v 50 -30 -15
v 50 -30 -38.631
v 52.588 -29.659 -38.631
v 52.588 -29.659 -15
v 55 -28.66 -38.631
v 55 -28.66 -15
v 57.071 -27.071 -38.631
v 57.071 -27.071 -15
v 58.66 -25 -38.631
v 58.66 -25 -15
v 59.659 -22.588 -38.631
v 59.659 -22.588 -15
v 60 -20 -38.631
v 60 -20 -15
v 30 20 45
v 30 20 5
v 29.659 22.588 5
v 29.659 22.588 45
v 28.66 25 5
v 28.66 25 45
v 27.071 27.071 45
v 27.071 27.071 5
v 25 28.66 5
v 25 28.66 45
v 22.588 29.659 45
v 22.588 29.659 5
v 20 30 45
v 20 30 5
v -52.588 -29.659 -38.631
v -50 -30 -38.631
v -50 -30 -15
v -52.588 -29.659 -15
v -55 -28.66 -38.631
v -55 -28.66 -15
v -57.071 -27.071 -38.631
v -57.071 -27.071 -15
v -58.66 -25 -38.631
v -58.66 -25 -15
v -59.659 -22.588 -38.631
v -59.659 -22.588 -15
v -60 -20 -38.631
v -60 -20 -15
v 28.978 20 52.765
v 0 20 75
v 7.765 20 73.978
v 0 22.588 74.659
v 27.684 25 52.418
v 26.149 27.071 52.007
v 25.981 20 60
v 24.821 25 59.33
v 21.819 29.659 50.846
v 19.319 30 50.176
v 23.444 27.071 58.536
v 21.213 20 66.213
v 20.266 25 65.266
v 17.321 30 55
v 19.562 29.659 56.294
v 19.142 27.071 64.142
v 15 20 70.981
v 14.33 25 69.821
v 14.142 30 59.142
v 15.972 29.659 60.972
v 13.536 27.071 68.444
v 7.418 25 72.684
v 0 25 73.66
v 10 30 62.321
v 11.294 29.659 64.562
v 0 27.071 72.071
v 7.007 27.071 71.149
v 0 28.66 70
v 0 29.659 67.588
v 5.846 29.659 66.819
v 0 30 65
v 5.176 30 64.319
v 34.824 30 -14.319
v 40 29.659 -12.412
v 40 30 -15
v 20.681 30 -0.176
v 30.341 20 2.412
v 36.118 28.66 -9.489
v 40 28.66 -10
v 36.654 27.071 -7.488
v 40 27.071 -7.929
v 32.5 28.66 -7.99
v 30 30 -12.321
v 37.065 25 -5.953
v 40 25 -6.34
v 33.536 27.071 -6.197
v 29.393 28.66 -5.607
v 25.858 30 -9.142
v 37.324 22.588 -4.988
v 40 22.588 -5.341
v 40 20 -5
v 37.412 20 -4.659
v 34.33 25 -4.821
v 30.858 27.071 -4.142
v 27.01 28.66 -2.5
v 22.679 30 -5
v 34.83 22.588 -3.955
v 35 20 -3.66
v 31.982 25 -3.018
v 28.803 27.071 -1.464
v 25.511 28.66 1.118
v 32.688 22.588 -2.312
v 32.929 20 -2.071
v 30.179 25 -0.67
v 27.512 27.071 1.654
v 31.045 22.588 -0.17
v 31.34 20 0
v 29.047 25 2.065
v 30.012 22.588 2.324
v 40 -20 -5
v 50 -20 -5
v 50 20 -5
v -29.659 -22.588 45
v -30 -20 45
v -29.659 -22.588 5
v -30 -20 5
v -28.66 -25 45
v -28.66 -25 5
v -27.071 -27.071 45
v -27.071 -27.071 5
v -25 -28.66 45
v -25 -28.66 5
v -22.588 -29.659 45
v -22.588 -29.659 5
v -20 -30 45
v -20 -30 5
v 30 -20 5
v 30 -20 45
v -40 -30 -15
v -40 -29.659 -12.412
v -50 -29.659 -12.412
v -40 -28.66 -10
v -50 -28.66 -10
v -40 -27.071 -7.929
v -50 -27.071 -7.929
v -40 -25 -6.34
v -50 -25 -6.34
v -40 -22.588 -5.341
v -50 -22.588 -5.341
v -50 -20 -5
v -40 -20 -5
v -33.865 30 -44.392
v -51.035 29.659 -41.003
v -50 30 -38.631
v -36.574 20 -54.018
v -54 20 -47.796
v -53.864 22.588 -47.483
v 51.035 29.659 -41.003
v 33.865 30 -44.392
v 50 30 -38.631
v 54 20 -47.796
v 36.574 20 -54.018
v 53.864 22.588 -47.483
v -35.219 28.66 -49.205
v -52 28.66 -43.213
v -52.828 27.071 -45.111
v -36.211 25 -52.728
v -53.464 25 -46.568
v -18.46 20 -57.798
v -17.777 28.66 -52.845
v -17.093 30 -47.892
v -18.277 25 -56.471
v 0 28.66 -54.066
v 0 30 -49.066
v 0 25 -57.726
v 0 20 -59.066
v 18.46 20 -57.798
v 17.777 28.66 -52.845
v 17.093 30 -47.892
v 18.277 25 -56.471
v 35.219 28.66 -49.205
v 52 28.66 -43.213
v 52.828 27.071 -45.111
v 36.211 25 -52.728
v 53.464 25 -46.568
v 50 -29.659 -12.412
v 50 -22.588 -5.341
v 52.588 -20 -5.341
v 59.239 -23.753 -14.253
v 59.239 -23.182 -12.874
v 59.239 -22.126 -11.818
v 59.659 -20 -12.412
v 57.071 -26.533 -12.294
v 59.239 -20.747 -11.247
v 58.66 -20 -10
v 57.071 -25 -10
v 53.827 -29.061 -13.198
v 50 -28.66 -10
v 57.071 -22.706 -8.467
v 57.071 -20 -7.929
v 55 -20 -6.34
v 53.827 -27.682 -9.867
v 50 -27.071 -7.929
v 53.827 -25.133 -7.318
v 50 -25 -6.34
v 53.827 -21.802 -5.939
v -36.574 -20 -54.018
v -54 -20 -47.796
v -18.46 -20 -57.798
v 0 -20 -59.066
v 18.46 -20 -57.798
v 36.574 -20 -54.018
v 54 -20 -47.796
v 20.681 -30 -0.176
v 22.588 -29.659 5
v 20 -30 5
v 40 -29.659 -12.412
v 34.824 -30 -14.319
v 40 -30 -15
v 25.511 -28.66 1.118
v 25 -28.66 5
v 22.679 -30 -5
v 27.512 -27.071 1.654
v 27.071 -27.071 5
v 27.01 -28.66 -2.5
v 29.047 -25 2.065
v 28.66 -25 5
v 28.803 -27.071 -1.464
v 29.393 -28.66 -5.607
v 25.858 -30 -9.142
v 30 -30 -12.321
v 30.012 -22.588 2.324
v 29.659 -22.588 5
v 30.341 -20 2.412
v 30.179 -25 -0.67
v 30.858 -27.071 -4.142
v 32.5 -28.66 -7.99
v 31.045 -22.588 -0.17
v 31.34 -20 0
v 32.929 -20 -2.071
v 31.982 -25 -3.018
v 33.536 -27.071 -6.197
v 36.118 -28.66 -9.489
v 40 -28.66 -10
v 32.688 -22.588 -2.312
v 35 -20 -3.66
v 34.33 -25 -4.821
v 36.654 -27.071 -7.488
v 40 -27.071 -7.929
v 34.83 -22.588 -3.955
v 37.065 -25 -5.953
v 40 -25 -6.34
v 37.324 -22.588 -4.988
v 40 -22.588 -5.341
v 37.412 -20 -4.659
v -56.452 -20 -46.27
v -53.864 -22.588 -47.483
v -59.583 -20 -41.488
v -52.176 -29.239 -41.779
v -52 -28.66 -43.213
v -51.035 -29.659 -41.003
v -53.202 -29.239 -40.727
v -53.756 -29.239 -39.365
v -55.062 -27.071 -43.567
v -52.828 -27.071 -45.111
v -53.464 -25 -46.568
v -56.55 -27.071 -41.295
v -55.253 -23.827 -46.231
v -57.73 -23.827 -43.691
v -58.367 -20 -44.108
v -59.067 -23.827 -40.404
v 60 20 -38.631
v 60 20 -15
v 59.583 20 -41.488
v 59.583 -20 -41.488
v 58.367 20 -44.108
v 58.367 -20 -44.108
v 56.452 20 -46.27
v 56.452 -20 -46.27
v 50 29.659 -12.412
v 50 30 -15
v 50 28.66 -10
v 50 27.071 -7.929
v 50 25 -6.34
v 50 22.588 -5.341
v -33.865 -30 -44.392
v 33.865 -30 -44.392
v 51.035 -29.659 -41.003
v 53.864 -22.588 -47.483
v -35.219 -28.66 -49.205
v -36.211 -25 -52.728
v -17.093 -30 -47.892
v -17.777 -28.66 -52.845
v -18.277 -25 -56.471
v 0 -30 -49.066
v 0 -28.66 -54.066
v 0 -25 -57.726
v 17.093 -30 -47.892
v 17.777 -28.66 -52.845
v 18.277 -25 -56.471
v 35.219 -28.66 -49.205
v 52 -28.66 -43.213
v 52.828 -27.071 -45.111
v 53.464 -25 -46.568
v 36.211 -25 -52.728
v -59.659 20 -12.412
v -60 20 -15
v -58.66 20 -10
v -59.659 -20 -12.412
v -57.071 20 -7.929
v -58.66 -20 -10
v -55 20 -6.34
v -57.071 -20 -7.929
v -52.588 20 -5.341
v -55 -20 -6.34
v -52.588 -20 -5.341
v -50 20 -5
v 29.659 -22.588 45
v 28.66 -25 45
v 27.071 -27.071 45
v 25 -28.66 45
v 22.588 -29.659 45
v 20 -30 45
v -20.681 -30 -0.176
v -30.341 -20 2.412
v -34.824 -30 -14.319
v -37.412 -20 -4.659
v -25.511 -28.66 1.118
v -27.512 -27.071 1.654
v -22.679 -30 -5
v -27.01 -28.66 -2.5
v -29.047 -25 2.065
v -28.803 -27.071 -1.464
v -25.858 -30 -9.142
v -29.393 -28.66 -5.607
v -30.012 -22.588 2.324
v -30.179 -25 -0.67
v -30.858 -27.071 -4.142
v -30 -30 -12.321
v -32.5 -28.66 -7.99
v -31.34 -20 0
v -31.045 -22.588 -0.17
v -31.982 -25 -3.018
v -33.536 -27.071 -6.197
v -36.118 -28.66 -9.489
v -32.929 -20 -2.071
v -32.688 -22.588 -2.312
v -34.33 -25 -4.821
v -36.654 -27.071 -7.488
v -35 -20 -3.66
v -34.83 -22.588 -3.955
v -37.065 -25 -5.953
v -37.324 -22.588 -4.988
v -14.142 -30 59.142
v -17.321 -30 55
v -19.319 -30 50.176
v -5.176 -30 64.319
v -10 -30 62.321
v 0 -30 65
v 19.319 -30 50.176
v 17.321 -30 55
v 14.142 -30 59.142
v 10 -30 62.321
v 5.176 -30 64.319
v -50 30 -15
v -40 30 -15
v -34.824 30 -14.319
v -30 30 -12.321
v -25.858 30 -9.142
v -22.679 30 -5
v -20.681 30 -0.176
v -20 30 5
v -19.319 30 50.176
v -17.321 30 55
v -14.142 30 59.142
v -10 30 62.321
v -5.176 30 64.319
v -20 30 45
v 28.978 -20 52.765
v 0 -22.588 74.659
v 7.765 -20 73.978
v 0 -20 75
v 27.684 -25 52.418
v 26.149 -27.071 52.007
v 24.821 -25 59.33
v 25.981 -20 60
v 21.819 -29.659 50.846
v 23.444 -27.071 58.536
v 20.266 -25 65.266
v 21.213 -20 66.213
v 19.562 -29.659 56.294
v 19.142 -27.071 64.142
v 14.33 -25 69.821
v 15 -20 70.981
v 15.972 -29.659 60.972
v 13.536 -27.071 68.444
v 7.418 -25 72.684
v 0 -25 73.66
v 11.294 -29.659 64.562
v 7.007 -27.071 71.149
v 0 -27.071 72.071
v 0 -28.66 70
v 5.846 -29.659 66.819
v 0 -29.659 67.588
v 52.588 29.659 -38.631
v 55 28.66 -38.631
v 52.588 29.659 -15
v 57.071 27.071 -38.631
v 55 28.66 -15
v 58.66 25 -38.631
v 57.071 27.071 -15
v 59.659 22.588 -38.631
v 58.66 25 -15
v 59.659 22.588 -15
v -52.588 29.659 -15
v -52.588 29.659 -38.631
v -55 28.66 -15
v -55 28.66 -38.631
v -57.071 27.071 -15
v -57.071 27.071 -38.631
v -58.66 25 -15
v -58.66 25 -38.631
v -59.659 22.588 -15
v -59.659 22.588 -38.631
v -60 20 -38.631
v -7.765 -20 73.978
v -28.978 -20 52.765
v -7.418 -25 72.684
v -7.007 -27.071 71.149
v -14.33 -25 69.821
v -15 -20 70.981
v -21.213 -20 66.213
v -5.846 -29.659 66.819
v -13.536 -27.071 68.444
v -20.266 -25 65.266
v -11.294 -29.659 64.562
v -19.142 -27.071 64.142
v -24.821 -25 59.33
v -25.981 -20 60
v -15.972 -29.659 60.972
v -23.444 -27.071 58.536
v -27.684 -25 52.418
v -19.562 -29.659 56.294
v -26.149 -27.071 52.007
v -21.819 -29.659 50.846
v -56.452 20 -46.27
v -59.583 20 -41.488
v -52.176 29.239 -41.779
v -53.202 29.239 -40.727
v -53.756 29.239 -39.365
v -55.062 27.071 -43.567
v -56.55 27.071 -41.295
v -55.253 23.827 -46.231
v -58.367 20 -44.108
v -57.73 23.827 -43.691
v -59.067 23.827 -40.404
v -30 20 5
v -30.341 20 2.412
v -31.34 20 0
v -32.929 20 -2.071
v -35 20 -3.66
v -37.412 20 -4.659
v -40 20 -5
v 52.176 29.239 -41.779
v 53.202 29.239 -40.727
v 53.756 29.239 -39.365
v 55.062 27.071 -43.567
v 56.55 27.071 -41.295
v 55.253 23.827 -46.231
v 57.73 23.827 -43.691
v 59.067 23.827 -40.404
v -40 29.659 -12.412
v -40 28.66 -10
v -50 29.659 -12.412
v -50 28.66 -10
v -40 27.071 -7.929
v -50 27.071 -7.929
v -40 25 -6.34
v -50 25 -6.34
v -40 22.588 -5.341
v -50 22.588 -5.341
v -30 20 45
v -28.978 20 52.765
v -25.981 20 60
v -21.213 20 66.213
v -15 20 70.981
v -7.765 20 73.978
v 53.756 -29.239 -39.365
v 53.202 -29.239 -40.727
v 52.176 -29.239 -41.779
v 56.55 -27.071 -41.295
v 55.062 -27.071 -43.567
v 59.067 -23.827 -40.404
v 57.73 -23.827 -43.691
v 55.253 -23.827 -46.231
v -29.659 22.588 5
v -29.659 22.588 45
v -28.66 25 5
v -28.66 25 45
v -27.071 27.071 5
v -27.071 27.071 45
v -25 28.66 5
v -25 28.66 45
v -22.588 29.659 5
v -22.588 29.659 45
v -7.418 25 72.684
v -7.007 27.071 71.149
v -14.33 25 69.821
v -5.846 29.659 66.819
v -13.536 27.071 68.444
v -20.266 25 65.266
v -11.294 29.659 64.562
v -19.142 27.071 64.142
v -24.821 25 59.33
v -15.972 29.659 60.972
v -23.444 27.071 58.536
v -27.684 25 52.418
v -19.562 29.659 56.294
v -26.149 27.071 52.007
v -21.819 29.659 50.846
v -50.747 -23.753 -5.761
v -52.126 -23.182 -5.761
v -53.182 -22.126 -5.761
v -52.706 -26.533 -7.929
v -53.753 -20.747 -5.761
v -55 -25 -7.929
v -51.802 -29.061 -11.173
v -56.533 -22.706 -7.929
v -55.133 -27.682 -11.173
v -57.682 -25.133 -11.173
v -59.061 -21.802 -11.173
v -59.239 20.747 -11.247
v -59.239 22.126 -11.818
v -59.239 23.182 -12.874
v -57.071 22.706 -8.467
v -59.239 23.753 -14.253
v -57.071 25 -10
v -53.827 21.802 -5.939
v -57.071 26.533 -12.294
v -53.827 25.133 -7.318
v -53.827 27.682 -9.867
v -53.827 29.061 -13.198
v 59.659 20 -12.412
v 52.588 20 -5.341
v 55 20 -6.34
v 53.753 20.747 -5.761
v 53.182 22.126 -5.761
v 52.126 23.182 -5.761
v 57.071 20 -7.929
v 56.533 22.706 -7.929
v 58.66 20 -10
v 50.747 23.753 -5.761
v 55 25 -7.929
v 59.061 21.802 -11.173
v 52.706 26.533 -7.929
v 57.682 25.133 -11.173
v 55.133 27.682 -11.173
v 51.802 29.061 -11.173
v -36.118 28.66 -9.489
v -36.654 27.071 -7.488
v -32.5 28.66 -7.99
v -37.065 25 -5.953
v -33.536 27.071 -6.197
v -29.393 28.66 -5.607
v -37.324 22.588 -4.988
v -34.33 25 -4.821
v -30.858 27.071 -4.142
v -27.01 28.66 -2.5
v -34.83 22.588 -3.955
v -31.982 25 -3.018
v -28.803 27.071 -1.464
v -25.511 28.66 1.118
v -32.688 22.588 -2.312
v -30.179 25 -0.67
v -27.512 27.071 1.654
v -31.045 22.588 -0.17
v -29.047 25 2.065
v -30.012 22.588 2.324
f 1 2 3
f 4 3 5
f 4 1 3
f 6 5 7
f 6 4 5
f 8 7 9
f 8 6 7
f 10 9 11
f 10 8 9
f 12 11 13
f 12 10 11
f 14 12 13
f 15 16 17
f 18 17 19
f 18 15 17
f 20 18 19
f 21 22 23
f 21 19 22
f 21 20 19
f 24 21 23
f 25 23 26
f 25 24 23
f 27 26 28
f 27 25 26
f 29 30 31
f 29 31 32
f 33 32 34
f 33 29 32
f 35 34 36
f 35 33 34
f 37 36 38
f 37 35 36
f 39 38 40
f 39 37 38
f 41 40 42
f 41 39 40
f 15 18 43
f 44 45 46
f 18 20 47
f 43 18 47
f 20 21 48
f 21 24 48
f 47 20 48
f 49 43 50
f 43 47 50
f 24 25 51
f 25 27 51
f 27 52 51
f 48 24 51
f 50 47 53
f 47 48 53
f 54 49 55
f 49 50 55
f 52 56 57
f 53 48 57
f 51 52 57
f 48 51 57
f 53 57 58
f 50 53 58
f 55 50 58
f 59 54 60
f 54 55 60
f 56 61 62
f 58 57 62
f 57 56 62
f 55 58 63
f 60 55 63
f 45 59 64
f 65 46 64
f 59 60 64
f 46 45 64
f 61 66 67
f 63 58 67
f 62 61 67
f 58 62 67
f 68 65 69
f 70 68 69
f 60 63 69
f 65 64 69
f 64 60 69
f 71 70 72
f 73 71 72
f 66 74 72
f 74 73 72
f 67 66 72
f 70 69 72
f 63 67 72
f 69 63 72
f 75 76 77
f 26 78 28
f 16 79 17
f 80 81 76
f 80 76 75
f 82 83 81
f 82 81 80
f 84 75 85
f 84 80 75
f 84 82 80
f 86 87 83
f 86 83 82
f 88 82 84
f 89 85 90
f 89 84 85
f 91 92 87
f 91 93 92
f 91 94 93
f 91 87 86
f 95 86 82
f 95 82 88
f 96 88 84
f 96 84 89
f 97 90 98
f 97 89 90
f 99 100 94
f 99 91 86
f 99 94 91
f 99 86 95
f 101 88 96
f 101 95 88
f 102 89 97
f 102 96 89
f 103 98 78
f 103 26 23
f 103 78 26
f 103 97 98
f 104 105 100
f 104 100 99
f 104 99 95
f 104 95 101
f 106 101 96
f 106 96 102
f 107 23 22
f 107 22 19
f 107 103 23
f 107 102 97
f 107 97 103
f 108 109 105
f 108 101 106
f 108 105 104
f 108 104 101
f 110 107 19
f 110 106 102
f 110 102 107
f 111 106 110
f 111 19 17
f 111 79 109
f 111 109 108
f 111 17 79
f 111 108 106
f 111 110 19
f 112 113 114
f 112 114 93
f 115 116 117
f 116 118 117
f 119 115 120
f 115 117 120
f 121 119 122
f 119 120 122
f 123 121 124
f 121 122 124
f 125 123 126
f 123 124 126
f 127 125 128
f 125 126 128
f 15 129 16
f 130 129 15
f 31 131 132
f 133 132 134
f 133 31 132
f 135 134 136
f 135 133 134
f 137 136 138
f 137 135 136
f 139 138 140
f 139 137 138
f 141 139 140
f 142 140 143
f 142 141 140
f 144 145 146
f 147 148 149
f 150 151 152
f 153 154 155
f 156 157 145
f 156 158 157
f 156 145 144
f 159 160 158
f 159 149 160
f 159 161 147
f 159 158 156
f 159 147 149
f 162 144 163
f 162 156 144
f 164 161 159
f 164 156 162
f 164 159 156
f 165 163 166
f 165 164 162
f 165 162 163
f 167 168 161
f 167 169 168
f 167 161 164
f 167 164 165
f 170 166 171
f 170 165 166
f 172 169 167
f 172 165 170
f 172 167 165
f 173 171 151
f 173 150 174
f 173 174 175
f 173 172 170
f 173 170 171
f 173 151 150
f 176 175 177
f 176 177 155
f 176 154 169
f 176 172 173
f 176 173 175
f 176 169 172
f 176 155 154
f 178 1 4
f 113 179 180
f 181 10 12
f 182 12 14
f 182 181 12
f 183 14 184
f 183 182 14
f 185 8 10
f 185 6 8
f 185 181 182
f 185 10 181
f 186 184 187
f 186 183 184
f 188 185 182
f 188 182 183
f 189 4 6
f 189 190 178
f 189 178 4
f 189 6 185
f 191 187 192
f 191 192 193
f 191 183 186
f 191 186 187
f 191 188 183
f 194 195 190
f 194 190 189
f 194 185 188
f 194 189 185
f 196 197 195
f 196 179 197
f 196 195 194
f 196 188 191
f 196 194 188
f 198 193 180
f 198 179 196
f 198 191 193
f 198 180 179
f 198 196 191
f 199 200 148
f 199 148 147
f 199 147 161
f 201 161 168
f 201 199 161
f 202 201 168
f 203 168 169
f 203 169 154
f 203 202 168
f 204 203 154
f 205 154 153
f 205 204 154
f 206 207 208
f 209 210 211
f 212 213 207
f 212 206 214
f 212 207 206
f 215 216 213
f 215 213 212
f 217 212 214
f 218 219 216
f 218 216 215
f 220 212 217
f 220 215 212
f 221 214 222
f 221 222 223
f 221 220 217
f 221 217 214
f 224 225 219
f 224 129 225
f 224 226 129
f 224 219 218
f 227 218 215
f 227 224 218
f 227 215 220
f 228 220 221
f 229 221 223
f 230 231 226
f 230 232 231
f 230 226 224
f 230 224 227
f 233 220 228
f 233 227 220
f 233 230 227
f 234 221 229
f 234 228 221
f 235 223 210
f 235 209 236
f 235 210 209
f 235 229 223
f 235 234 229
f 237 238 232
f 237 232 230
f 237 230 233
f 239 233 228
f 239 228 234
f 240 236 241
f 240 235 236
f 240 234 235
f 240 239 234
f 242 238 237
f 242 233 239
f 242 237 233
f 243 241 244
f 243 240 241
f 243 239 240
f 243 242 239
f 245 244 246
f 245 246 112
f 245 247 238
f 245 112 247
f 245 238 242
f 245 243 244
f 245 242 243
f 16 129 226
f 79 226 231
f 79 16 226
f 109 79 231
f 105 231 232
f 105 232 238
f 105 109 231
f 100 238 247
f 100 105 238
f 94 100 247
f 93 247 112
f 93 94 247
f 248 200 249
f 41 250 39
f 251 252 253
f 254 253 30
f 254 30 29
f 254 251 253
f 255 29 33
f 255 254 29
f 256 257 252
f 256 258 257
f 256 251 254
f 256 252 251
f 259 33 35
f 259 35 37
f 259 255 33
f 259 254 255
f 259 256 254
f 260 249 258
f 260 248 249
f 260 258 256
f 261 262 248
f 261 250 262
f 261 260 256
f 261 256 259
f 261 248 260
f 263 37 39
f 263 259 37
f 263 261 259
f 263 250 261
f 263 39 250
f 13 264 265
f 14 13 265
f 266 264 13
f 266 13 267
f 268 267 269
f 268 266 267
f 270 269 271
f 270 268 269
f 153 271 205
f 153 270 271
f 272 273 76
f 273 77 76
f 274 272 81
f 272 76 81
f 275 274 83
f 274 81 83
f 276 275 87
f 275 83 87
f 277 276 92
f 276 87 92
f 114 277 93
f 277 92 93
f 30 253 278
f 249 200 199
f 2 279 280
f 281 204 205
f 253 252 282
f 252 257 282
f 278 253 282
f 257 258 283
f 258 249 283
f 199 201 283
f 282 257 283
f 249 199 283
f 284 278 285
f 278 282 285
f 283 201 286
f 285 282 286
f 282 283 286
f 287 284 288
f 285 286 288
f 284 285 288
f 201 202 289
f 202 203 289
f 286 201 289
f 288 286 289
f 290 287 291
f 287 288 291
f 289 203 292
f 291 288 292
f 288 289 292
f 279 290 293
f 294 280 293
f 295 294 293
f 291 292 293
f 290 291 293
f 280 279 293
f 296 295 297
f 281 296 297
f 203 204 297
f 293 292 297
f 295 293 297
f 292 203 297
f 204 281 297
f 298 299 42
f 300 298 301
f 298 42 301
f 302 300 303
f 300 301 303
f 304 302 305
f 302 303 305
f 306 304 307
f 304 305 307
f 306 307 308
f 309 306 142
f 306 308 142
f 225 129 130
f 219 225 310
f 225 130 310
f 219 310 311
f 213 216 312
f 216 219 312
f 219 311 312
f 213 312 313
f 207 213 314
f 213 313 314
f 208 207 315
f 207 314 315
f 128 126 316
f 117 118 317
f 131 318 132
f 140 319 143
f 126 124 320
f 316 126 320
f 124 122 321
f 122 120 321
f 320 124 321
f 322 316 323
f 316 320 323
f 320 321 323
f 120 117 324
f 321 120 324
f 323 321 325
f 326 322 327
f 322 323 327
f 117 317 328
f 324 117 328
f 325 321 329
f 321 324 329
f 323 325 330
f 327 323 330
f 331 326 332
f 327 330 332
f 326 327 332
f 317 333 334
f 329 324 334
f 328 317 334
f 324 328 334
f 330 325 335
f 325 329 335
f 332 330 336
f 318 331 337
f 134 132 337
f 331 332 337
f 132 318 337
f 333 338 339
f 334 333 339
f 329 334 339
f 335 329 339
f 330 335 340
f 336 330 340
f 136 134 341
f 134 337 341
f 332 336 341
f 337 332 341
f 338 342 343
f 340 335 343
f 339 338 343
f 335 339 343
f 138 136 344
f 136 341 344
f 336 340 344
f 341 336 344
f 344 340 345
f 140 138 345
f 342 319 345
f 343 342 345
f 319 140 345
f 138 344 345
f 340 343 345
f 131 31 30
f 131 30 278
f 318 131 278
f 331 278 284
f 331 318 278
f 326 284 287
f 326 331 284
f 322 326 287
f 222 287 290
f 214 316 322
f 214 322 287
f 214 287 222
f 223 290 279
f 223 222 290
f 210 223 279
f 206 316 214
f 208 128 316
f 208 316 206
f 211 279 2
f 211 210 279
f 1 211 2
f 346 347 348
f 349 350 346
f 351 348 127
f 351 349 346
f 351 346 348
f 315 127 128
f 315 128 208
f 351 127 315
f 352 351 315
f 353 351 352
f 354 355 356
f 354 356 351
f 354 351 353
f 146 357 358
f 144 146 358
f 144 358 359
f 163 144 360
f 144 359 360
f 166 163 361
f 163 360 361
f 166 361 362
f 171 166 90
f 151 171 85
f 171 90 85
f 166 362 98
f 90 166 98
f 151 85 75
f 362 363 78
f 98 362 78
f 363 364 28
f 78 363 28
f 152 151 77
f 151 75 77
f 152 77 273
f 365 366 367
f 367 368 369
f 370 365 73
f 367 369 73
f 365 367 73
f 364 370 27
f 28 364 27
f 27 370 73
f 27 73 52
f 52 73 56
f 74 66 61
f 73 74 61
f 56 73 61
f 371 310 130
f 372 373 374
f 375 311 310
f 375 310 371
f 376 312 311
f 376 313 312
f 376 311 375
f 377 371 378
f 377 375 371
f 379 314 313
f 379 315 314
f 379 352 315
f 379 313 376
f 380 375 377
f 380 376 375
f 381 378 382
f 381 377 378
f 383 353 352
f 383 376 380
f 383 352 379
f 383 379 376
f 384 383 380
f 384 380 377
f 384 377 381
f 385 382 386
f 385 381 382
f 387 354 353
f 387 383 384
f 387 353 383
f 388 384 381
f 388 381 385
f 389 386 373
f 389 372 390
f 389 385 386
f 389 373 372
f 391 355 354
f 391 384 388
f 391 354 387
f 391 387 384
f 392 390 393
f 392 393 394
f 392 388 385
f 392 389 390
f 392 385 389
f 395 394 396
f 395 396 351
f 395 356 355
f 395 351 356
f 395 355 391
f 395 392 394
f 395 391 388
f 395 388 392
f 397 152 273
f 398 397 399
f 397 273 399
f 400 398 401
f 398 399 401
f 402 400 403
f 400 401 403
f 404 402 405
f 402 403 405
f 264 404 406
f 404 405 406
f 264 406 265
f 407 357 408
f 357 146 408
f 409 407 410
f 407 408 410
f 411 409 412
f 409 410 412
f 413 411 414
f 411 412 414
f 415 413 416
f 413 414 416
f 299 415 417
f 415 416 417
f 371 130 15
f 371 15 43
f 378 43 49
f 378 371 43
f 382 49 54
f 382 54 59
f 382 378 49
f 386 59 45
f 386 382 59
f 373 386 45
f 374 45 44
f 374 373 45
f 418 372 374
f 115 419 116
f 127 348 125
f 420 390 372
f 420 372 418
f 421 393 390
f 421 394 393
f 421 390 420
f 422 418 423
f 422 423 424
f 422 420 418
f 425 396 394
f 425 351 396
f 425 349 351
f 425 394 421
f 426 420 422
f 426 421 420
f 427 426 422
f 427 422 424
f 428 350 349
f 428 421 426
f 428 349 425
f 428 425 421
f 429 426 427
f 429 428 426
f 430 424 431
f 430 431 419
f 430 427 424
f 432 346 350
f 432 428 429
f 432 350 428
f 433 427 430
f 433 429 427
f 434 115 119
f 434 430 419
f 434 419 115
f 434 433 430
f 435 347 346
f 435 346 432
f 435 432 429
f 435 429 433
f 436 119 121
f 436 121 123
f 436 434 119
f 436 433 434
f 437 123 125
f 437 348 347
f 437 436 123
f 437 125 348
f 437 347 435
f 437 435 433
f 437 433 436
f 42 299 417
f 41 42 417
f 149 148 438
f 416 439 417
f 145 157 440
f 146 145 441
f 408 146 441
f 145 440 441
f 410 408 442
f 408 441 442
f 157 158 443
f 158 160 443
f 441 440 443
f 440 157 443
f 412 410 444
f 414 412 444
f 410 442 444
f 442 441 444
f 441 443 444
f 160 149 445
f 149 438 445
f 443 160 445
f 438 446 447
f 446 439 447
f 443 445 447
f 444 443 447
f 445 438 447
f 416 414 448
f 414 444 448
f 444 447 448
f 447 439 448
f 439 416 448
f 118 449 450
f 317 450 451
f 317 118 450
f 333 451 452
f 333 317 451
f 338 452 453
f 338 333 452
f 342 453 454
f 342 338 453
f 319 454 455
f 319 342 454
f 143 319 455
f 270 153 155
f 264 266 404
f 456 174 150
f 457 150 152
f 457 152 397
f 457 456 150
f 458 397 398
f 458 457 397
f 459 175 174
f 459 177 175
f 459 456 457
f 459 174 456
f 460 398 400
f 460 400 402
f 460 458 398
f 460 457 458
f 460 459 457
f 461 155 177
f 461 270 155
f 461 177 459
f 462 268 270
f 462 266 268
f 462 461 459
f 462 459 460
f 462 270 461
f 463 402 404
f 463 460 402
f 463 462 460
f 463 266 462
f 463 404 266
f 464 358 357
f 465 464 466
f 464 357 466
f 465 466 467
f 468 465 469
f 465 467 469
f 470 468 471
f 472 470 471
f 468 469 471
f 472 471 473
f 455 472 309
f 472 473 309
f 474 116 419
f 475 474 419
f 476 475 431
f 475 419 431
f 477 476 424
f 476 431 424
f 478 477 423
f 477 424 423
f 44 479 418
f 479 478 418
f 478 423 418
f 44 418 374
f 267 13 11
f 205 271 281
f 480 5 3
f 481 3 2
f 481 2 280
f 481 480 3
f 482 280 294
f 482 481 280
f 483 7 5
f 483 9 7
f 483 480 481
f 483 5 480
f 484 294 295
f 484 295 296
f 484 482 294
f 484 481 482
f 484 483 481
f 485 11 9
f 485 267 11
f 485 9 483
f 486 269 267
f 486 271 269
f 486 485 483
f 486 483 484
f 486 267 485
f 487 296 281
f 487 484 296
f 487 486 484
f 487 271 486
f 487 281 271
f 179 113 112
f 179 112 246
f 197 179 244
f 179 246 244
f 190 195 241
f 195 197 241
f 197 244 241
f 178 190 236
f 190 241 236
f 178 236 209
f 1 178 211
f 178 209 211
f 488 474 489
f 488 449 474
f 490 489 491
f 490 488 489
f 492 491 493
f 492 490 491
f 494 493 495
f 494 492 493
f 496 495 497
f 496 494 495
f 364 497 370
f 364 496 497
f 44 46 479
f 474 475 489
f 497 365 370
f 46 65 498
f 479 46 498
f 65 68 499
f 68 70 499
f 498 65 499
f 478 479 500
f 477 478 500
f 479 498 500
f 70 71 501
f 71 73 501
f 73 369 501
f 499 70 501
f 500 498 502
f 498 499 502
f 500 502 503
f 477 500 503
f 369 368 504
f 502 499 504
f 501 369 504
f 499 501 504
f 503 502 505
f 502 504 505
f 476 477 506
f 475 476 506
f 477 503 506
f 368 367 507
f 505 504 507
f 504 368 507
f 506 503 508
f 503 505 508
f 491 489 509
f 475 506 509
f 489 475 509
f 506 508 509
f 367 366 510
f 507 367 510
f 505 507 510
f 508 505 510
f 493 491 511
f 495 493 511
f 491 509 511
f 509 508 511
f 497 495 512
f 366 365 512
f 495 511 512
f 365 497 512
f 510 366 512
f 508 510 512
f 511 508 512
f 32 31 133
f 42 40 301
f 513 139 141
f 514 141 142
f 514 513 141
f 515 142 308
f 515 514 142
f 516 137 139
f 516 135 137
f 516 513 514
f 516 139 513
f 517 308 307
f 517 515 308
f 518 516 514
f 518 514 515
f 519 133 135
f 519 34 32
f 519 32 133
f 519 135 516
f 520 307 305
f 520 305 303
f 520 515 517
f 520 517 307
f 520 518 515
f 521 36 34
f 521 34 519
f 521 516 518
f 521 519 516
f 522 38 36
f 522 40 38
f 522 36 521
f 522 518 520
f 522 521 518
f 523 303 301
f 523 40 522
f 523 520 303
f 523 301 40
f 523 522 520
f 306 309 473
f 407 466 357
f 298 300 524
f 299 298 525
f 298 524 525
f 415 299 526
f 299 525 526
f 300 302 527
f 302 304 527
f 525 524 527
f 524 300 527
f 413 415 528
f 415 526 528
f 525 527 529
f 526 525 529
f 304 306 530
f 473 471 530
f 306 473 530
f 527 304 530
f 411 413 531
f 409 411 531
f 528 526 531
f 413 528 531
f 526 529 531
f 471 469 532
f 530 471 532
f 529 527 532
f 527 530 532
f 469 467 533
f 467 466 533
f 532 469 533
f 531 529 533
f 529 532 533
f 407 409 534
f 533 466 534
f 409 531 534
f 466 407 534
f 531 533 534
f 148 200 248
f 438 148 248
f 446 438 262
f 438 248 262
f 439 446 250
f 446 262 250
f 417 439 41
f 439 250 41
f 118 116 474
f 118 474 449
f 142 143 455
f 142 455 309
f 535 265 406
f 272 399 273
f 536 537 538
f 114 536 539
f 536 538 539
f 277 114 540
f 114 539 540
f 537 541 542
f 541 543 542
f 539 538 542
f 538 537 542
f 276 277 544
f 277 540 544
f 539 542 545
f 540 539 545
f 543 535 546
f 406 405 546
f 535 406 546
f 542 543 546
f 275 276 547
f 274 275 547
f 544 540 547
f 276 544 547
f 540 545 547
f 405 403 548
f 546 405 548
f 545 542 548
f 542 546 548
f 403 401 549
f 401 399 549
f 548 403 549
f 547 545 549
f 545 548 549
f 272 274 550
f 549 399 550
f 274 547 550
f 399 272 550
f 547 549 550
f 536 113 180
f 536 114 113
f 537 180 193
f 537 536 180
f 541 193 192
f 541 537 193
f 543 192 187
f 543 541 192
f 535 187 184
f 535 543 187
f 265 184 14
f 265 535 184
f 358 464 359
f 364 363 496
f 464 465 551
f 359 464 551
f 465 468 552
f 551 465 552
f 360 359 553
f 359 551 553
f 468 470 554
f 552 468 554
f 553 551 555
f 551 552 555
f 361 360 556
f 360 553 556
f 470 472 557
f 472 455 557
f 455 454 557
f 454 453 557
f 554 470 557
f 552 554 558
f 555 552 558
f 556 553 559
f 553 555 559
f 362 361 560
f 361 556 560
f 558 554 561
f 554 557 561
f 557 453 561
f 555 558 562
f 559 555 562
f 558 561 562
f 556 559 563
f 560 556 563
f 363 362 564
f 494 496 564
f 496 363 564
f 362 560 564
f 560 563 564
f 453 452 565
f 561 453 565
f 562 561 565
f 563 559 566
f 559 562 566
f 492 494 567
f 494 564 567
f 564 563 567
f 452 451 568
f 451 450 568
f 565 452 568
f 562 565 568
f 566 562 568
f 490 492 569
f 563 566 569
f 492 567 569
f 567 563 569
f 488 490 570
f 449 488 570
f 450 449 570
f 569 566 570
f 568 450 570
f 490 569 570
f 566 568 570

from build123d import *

# Parameters (mm, degrees)
F1_DEPTH = 30
F2_R     = 29.99999
F3_R     = 10


# Not quite as in the source:
# - a fillet or chamfer is up to 0.001 mm smaller than in the source, because OpenCascade refuses the exact size


with BuildPart() as f1:
    # F0 (on Front) → F1 (new body, symmetric)
    with BuildSketch(Plane.XZ):
        with BuildLine():
            Line((30, -5), (30, 75))
            Line((30, 75), (-30, 75))
            Line((-30, 75), (-30, -5))
            Line((-30, -5), (-60, -5))
            Line((-60, -5), (-60, -45))
            ThreePointArc((-60, -45), (0, -59.0661337755), (60, -45))
            Line((60, -45), (60, -5))
            Line((60, -5), (30, -5))
        make_face()
    extrude(amount=F1_DEPTH, both=True)

    # F2 (radius 30 in the source; OpenCascade refuses exactly that, so slightly less here)
    f2_edges = [f1.edges().sort_by_distance(p)[0] for p in [
        (30, 0, 75),
        (-30, 0, 75),
    ]]
    fillet(f2_edges, radius=F2_R)

    # F3
    f3_edges = [f1.edges().sort_by_distance(p)[0] for p in [
        (30, -30, 20.000005),
        (21.213206, -30, 66.213206),
        (45, -30, -5),
        (0, -30, 75),
        (60, -30, -25),
        (-21.213206, -30, 66.213206),
        (0, -30, -59.066134),
        (-30, -30, 20.000005),
        (-60, -30, -25),
        (-45, -30, -5),
        (30, 30, 20.000005),
        (30, 0, 45.00001),
        (30, 0, -5),
        (60, 30, -25),
        (60, 0, -5),
        (60, 0, -45),
        (-30, 0, -5),
        (-45, 30, -5),
        (-60, 0, -5),
        (21.213206, 30, 66.213206),
        (45, 30, -5),
        (0, 30, 75),
        (-21.213206, 30, 66.213206),
        (0, 30, -59.066134),
        (-30, 30, 20.000005),
        (-60, 30, -25),
        (-60, 0, -45),
    ]]
    fillet(f3_edges, radius=F3_R)


solid = f1.part
